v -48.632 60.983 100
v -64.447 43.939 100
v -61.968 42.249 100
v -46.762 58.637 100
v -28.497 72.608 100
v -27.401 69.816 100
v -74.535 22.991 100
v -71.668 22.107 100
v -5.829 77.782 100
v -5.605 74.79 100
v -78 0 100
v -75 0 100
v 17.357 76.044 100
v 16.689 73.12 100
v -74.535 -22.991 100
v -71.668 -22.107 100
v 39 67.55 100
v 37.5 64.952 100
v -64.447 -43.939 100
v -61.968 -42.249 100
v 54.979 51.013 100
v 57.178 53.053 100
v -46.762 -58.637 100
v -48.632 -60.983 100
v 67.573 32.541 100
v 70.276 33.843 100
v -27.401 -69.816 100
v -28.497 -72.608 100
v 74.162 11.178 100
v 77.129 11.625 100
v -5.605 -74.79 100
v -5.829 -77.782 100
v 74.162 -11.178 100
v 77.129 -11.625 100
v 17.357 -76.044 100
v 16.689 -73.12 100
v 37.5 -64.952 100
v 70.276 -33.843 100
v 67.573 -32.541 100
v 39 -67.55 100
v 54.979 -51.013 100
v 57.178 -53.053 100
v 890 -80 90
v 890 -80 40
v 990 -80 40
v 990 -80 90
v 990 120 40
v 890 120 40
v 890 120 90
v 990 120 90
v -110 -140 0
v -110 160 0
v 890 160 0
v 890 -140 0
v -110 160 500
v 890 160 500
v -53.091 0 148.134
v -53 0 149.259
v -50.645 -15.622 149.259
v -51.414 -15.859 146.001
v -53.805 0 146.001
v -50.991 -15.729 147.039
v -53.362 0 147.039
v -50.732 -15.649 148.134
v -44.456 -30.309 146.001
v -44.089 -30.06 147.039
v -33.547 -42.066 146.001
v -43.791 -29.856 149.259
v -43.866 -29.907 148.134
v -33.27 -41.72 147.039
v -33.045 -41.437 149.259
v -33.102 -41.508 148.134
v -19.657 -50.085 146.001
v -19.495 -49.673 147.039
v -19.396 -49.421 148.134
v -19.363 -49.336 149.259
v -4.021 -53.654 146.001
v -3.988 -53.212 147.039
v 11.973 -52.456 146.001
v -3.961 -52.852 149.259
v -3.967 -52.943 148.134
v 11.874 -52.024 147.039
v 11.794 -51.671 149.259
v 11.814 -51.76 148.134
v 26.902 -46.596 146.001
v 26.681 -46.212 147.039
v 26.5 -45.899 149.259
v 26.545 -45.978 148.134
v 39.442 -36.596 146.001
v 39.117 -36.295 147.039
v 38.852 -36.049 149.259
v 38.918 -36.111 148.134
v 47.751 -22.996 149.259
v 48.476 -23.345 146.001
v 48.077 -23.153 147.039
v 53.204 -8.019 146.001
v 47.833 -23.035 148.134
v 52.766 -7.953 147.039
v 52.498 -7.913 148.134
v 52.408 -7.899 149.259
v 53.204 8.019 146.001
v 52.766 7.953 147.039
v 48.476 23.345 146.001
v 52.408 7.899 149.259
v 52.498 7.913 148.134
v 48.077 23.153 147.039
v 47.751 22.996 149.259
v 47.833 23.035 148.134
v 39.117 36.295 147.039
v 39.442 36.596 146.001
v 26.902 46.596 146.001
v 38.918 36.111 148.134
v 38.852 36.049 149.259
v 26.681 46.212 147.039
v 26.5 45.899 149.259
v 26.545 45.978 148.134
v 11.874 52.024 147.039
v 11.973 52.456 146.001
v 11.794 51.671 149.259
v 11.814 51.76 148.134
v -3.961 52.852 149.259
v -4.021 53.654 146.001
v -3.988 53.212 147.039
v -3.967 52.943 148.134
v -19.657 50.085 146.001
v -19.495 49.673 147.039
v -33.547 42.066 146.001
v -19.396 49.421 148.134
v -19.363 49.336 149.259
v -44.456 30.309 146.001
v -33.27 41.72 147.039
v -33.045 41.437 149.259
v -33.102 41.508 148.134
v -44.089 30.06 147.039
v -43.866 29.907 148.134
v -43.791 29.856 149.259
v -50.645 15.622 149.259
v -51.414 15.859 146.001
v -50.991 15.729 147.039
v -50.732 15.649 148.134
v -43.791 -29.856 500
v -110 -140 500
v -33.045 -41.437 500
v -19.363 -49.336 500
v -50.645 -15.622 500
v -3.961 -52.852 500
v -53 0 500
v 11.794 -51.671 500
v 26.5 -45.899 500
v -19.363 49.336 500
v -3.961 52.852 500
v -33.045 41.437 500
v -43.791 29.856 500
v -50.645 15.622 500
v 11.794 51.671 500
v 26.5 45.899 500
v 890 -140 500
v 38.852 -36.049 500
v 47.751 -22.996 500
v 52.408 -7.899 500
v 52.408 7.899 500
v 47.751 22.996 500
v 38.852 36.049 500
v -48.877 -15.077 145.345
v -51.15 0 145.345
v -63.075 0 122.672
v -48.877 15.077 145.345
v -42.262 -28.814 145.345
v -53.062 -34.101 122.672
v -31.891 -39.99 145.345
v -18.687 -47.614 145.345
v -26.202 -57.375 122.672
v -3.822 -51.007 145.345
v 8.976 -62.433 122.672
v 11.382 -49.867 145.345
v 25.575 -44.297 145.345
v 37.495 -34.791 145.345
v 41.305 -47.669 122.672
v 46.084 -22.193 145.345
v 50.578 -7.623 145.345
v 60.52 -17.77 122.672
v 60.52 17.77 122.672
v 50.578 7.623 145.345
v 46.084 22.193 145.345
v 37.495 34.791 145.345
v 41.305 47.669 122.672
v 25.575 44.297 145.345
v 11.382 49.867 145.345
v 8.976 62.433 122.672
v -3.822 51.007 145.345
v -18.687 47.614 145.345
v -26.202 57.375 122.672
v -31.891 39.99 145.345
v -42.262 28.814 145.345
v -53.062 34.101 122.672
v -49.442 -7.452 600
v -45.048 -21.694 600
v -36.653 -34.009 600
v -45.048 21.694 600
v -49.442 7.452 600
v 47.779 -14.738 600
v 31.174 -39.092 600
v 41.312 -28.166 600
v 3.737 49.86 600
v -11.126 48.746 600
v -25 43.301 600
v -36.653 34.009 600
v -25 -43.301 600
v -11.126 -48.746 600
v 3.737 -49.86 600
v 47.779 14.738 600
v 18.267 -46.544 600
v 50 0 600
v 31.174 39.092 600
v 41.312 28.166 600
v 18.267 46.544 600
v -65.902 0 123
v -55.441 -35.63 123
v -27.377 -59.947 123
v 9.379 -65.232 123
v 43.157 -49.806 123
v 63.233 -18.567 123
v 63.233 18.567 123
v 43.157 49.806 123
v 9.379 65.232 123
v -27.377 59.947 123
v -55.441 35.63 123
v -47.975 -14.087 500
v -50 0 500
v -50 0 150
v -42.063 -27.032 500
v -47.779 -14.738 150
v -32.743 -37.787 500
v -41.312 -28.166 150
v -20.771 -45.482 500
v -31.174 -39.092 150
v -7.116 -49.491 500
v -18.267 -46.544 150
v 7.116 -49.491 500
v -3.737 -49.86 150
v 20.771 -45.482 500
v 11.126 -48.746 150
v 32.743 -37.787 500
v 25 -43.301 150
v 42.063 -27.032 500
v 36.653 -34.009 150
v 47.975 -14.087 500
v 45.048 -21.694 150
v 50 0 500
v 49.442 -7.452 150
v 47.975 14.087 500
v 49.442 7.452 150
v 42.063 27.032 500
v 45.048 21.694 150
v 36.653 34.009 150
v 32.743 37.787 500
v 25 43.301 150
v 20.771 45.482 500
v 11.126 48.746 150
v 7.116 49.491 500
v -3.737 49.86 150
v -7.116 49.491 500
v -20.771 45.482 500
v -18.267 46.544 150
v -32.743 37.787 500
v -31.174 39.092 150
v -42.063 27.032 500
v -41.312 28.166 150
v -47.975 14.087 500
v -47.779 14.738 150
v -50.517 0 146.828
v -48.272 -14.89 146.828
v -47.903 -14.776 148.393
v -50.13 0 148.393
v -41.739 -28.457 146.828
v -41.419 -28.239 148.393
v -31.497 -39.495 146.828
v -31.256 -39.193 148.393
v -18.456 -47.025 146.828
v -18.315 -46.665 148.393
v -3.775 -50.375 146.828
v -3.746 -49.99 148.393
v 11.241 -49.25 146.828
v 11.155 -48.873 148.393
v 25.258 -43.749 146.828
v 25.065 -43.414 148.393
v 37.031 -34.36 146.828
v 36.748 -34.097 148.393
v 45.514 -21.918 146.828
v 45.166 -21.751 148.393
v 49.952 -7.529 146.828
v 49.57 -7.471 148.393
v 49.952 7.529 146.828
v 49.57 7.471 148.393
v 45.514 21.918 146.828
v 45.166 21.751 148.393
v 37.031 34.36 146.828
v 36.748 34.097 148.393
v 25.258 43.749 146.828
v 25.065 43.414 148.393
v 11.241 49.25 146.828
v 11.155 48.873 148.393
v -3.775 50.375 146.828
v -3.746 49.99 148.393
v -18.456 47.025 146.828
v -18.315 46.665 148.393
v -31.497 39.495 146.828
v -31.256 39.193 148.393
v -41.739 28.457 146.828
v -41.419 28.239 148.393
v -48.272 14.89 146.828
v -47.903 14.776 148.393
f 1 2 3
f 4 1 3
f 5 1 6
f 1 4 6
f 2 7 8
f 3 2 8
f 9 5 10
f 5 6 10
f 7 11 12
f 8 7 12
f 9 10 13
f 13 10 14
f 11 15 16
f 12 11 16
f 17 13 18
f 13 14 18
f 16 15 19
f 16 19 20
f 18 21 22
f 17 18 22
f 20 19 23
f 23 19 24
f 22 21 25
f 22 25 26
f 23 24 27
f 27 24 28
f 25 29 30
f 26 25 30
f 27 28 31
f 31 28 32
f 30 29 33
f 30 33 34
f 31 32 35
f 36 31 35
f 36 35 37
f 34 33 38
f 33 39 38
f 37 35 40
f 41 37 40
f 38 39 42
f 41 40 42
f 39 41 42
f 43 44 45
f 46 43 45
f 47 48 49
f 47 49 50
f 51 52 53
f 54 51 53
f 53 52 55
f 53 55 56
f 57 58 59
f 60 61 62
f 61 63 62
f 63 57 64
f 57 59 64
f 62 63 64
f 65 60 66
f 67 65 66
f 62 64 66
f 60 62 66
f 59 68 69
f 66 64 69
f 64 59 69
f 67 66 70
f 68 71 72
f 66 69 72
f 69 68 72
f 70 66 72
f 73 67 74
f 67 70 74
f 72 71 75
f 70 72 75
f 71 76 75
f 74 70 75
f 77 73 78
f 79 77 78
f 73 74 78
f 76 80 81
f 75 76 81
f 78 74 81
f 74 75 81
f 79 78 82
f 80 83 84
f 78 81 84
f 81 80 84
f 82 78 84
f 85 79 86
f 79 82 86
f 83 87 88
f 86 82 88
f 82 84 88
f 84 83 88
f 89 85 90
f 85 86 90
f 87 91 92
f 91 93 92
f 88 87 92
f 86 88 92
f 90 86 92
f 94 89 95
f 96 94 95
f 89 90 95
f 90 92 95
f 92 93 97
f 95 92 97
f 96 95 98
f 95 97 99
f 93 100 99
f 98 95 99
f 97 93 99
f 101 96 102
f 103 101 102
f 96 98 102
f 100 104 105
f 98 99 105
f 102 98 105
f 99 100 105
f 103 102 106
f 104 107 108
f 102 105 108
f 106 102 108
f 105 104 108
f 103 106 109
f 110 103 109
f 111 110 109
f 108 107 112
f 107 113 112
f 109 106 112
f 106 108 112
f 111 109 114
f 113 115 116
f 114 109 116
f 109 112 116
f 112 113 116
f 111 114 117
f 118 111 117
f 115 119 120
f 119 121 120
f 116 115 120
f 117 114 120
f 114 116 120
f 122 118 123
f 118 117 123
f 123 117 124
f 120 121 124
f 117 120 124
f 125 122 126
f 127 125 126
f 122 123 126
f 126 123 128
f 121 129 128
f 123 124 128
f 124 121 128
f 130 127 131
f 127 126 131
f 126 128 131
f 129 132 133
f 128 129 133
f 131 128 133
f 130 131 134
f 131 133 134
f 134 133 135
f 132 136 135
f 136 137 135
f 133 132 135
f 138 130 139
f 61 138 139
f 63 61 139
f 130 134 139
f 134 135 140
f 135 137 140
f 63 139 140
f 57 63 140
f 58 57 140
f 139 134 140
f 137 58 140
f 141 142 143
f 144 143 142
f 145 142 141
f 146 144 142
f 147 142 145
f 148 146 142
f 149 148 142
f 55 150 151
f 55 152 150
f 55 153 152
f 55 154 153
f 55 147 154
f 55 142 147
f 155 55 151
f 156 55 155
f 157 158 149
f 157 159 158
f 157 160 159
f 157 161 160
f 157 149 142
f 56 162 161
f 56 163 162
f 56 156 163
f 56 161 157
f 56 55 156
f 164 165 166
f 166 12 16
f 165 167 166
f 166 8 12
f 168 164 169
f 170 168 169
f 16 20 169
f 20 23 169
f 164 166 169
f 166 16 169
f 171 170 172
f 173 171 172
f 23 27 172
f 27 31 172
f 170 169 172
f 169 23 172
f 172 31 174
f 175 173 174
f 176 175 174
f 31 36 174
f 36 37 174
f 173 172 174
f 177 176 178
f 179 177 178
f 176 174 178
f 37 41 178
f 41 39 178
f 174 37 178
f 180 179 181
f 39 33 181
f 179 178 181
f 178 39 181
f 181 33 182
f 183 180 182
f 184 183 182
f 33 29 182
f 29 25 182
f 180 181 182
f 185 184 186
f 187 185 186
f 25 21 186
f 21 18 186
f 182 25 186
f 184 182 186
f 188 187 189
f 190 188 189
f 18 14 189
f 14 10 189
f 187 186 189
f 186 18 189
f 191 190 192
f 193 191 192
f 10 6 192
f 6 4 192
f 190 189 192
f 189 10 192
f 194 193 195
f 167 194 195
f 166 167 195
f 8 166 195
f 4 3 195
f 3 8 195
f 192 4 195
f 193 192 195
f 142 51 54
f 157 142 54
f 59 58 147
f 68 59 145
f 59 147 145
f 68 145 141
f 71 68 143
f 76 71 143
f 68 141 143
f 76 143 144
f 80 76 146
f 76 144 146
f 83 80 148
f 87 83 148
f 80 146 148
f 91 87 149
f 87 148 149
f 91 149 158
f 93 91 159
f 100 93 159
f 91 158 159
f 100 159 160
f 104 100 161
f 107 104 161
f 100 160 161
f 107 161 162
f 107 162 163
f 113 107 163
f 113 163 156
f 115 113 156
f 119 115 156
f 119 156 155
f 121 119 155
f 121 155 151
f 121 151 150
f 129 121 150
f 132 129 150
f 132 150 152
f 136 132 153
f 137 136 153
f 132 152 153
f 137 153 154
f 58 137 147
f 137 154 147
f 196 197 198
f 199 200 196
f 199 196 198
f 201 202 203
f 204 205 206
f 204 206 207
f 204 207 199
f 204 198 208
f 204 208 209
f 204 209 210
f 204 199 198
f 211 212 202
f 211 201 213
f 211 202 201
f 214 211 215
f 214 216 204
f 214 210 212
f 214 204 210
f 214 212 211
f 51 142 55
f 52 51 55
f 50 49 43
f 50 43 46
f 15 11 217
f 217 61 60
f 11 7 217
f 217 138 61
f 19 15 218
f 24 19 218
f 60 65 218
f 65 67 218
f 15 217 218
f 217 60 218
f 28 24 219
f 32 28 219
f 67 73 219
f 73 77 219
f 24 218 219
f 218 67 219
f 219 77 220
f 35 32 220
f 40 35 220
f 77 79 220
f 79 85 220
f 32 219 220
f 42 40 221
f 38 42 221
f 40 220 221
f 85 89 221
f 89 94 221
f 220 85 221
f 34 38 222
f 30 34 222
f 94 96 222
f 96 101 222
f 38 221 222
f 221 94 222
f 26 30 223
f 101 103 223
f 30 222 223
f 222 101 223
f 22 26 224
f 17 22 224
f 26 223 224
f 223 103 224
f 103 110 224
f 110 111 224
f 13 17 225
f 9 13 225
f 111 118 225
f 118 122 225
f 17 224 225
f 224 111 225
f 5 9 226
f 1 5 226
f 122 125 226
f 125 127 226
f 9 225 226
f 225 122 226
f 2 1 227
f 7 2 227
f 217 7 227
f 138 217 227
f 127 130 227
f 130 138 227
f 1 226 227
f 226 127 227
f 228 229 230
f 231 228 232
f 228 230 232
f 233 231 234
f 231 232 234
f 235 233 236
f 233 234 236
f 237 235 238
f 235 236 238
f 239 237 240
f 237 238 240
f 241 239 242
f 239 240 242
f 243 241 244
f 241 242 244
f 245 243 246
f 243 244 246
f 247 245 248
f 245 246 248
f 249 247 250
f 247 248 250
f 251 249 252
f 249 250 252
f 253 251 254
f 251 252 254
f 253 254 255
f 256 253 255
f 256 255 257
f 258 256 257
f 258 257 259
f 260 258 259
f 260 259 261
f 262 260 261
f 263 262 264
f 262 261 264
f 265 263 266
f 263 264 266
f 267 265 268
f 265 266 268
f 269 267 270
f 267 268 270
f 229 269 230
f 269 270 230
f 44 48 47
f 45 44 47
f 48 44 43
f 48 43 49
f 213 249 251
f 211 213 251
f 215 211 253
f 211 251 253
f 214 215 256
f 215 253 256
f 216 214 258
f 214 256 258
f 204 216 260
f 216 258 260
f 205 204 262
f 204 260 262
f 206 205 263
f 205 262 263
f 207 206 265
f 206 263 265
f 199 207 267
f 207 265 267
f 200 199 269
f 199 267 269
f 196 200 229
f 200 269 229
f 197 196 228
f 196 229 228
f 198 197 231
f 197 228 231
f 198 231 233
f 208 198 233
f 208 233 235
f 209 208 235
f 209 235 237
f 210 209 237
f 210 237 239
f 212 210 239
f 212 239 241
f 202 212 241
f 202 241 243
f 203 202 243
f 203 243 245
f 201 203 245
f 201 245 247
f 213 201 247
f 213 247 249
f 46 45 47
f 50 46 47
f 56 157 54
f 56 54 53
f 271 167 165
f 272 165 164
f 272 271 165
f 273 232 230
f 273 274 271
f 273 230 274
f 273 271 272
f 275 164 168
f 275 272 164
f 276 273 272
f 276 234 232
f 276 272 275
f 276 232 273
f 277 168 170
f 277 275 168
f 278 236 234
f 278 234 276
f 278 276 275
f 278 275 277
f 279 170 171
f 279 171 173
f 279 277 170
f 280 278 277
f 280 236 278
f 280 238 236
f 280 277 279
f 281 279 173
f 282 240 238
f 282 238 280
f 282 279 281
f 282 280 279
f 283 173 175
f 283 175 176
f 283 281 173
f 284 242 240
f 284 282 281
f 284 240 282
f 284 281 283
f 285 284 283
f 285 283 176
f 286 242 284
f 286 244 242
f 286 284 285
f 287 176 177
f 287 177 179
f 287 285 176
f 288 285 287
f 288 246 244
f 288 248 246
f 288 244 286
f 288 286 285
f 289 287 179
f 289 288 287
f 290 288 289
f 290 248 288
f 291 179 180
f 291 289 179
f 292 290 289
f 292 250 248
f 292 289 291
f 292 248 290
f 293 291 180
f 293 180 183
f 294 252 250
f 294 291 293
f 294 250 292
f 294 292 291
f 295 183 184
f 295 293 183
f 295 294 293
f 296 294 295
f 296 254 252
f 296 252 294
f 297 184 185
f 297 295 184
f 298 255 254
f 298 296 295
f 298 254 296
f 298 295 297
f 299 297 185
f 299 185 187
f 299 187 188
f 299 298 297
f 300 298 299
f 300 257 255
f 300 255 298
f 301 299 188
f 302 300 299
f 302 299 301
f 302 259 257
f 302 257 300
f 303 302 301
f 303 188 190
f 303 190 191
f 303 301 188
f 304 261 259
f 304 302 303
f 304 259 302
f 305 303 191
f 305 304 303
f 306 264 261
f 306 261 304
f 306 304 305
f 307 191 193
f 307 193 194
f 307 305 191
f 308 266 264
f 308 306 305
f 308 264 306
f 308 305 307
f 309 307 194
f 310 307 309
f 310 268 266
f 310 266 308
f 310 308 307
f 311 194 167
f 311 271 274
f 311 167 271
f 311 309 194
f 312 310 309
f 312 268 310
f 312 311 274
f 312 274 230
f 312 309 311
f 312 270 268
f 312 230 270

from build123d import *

# Parameters (mm, degrees)
BOX_W        = 1000
BOX_H        = 300
BOX_DEPTH    = 500
SKETCH001_R  = 50
PAD_DEPTH    = 100
BOX001_W     = 100
BOX001_H     = 200
BOX001_DEPTH = 50


with BuildPart() as body:
    # Sketch → Revolution (revolve)
    with BuildSketch(Plane.XZ):
        with BuildLine():
            Line((-50, 649.259148), (-50, 150))
            ThreePointArc((-51.149586, 145.344876), (-50.29165, 147.602515), (-50, 150))
            Line((-51.149586, 145.344876), (-75, 100))
            Line((-75, 100), (-78, 100))
            Line((-78, 100), (-53.804711, 146.000561))
            ThreePointArc((-53.804711, 146.000561), (-53.204155, 147.580909), (-53, 149.259148))
            Line((-53, 149.259148), (-53, 649.259148))
            Line((-53, 649.259148), (-50, 649.259148))
        make_face()
    revolve(axis=Axis((0, 0, 0), (0, 0, 1)))


with BuildPart() as body001:
    # Box → Box (new body)
    with BuildSketch(Plane(origin=(-110, -140, 0), x_dir=(1, 0, 0), z_dir=(0, 0, 1))):
        with Locations((500, 150)):
            Rectangle(BOX_W, BOX_H)
    extrude(amount=BOX_DEPTH)

    # Cut: cut Body
    add(body.part, mode=Mode.SUBTRACT)

    # Sketch001 (on Face14 of BaseFeature) → Pad (new body)
    with BuildSketch(Plane.XY.offset(500)):
        Circle(SKETCH001_R)
    extrude(amount=PAD_DEPTH)


with BuildPart() as box001:
    # Box001 → Box001 (new body)
    with BuildSketch(Plane(origin=(890, -80, 40), x_dir=(1, 0, 0), z_dir=(0, 0, 1))):
        with Locations((50, 100)):
            Rectangle(BOX001_W, BOX001_H)
    extrude(amount=BOX001_DEPTH)


solid = Compound([body001.part, box001.part])
